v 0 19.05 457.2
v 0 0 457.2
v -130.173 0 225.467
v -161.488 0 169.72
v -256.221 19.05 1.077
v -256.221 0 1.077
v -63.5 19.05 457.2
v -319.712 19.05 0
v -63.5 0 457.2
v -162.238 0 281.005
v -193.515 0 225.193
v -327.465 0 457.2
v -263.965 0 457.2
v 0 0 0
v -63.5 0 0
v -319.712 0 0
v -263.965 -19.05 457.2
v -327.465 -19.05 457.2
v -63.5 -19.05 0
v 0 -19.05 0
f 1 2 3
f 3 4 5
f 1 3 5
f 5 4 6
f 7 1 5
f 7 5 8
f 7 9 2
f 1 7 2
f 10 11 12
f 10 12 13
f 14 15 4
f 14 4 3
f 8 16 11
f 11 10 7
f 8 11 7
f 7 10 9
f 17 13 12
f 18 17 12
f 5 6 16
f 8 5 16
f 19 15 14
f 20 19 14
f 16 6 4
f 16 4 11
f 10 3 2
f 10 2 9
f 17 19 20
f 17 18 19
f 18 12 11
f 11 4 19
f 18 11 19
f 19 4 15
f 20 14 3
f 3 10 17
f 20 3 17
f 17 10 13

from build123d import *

# Parameters (mm, degrees)
F1_DEPTH = 19.05
F3_DEPTH = 19.05


with BuildPart() as f1:
    # F0 (on Front) → F1 (new body)
    with BuildSketch(Plane.XZ):
        Polygon((-63.5, 0), (0, 0), (-263.9645430735, 457.2), (-327.4645430735, 457.2), align=None)
    extrude(amount=F1_DEPTH)

    # F2 (on face) → F3 (join)
    with BuildSketch(Plane(origin=(0, 0, 0), x_dir=(-1, 0, 0), z_dir=(0, 1, 0))):
        Polygon((130.1731683118, 225.4665412982), (162.2384621855, 281.0052594471), (63.5, 457.2), (0, 457.2), align=None)
        Polygon((161.4879657143, 169.7201351475), (193.5152767914, 225.1930651629), (162.2384621855, 281.0052594471), (130.1731683118, 225.4665412982), align=None)
        Polygon((256.2212291294, 1.0765731137), (319.7121024132, 0), (193.5152767914, 225.1930651629), (161.4879657143, 169.7201351475), align=None)
    extrude(amount=F3_DEPTH)


solid = f1.part
